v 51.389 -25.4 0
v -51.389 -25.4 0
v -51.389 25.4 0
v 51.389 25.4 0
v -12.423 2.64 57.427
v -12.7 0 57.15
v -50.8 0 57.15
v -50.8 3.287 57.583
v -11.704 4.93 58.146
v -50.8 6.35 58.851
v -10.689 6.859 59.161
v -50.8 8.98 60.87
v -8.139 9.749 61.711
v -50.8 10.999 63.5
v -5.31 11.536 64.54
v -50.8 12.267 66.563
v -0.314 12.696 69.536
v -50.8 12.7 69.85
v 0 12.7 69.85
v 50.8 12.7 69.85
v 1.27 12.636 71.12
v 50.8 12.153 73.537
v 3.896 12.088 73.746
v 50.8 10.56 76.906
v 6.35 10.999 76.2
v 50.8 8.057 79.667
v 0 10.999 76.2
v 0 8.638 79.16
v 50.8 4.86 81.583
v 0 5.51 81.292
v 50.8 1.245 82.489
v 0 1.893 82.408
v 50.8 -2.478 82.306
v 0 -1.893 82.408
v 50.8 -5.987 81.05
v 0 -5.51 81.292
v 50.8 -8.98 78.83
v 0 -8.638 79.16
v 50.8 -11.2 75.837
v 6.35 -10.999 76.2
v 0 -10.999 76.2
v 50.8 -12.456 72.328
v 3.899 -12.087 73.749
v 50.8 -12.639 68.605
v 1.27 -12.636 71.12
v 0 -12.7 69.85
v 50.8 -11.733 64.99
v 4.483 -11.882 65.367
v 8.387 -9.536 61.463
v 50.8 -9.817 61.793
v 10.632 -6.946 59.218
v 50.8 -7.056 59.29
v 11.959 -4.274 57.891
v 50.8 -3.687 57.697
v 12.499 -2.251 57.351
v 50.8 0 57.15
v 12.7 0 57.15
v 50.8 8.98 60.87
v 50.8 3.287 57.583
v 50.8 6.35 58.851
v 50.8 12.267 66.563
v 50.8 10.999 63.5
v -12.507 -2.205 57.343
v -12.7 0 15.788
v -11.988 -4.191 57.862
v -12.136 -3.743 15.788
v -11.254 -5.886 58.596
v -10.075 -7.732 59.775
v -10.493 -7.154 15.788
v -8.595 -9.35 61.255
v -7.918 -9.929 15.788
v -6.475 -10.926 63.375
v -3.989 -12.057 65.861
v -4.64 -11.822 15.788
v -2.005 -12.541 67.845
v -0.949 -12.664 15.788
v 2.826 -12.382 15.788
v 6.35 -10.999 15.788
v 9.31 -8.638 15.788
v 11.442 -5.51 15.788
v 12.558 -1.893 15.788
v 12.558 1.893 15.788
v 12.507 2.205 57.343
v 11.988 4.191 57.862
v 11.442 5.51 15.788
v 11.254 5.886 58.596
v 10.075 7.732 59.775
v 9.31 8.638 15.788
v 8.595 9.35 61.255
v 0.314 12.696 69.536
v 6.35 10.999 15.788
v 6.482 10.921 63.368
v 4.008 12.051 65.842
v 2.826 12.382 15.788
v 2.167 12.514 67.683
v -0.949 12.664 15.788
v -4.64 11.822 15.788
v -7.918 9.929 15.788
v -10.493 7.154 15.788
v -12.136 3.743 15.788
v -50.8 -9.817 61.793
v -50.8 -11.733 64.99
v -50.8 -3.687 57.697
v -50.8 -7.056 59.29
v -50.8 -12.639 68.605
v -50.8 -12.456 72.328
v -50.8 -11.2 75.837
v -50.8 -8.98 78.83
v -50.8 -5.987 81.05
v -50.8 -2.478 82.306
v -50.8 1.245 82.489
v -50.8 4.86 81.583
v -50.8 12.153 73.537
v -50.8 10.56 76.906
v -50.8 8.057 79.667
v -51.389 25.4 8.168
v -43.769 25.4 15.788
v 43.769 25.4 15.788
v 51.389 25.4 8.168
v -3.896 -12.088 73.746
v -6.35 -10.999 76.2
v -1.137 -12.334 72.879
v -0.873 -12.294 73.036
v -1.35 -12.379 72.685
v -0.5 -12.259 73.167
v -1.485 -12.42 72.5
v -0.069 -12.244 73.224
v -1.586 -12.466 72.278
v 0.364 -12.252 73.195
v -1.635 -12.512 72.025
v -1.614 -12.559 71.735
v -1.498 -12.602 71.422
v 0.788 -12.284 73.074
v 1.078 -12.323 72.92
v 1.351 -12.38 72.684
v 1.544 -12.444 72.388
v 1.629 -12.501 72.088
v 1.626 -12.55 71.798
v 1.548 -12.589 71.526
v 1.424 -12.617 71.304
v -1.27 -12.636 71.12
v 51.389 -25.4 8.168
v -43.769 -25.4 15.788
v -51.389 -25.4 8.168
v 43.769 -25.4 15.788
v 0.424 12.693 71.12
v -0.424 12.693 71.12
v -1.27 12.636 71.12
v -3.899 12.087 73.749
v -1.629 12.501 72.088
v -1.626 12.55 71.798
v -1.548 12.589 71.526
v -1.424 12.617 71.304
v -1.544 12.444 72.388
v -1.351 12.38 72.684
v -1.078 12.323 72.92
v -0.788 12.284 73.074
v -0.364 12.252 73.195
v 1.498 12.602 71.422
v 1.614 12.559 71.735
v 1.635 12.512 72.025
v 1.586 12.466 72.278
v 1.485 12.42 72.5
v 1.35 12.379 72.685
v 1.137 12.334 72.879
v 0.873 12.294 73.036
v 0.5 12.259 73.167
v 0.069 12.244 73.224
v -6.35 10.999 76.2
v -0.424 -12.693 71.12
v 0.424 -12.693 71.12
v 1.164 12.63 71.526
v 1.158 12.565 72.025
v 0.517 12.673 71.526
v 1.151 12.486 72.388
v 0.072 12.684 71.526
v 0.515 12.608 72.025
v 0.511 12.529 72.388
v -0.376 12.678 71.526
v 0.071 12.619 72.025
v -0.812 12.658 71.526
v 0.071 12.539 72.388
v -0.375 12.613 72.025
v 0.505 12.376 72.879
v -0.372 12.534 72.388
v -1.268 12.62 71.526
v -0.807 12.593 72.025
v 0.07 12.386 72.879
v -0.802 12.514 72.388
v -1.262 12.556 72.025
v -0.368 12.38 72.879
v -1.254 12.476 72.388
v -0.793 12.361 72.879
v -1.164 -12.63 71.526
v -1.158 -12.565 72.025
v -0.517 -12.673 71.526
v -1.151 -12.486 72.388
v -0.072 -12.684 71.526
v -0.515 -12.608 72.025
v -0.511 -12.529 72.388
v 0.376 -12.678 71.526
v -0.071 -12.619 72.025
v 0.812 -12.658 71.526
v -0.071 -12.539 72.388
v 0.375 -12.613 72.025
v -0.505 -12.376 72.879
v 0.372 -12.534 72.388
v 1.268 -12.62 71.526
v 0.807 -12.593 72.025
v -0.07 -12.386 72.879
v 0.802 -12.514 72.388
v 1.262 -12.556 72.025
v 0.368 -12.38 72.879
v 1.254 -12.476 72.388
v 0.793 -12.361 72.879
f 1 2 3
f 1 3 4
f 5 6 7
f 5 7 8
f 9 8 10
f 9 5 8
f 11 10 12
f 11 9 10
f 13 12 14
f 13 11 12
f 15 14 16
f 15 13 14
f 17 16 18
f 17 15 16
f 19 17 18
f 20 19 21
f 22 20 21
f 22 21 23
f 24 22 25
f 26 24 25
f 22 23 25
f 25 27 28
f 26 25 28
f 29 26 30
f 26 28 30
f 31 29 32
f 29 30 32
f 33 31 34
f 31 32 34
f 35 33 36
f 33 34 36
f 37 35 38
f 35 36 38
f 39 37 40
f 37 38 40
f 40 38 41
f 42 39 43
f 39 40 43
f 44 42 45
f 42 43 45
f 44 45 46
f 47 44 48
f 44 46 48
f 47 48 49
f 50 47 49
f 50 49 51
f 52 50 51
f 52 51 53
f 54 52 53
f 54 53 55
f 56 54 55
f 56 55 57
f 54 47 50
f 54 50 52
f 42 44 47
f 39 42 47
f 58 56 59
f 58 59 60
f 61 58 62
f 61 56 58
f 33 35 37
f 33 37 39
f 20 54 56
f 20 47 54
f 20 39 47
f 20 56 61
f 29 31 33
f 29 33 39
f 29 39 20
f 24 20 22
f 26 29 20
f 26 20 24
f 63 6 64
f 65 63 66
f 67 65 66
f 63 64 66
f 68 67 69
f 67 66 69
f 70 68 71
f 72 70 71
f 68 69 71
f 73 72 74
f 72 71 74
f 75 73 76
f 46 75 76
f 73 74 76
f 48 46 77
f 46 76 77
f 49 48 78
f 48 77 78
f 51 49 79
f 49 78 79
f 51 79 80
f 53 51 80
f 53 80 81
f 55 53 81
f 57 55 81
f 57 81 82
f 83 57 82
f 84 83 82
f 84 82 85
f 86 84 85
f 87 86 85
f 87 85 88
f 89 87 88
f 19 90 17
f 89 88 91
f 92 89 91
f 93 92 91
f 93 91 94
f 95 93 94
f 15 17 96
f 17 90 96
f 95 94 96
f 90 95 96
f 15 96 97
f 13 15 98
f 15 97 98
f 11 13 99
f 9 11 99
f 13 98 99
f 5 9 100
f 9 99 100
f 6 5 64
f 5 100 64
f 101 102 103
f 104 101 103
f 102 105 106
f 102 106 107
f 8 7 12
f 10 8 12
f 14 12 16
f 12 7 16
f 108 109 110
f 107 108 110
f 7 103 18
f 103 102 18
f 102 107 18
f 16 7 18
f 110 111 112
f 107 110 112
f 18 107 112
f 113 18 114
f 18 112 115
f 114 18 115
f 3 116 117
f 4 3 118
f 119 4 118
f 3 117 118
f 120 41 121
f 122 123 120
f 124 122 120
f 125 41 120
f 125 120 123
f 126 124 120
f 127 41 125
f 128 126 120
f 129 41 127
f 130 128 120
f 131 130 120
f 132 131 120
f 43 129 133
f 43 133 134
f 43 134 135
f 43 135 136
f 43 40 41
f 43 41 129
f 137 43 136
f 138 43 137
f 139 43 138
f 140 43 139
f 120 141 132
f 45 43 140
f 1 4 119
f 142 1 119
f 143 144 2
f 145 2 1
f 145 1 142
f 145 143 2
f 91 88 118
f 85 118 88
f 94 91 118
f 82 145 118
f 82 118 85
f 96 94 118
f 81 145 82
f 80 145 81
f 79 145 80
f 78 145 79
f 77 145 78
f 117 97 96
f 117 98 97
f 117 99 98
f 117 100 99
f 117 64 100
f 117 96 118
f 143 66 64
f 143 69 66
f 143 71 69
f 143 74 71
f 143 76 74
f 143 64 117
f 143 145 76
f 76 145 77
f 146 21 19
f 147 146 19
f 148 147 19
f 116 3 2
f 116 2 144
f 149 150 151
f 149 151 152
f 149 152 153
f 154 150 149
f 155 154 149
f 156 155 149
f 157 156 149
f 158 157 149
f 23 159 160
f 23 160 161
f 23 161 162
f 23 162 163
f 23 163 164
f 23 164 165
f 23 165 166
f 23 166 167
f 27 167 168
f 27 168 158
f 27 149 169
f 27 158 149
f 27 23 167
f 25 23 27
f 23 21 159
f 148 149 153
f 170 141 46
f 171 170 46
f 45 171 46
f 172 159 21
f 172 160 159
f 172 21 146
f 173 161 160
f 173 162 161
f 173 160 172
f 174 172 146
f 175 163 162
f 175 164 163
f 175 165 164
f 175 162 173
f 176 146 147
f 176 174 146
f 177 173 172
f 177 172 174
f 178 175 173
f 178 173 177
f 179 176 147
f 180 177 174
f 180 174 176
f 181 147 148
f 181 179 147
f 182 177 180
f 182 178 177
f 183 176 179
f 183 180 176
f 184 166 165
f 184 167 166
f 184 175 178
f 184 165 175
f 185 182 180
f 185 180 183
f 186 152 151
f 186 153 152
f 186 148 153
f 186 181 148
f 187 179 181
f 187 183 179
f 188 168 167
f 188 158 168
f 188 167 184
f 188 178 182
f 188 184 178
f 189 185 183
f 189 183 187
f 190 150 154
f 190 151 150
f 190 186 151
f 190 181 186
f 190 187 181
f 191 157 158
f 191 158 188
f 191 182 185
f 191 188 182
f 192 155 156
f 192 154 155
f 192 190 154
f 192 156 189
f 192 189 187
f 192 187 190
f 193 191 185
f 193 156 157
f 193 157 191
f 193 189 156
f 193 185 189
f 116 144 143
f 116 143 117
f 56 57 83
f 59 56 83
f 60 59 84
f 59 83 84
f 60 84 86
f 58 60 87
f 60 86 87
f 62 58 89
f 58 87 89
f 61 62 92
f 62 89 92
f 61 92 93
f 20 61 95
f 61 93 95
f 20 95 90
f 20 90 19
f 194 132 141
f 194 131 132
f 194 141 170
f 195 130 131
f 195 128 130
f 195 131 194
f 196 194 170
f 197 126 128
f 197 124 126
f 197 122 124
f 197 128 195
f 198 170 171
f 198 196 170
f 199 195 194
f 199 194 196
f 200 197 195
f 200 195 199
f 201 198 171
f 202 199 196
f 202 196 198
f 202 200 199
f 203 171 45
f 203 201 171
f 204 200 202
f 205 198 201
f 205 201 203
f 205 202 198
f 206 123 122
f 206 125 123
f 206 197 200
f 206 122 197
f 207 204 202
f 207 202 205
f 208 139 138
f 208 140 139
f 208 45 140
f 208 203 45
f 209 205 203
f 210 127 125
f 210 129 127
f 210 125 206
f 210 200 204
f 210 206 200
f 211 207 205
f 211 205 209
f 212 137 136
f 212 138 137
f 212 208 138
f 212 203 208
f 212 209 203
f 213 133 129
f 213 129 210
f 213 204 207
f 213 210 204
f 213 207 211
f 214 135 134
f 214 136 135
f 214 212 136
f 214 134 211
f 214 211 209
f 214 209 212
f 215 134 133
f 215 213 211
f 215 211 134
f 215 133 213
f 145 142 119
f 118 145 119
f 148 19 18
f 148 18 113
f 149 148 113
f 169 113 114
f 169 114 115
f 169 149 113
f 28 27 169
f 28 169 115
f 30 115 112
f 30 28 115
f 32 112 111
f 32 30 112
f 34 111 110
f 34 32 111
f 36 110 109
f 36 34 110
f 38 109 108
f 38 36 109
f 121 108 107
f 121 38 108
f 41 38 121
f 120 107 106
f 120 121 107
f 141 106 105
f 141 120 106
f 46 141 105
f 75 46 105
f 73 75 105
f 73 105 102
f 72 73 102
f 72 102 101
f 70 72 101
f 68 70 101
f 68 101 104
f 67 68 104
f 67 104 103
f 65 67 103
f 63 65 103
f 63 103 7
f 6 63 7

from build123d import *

# Parameters (mm, degrees)
F0_W         = 12.7
F0_H         = 6.35
F0_H_2       = 47.7120632529
F0_H_3       = 15.7879367471
F0_W_2       = 38.6885356486
F2_DEPTH     = 25.4
F4_DEPTH     = 50.8
F5_SIZE      = 7.62
F6_T4_ANGLE  = 174.612014659
F6_S5_R      = 12.7
F6_T6_DEPTH  = 17
F6_T10_ANGLE = 174.612014659
F6_S11_R     = 12.7
F6_T12_DEPTH = 17


# Not quite as in the source:
# - a fillet or chamfer that OpenCascade refuses, or shapes differently, is made with other operations: its cross-section is extruded or revolved along the edge and cut away or added


with BuildPart() as f1:
    # F0 (on Front) → F1 (revolve)
    with BuildSketch(Plane.XZ):
        with Locations((-6.35, 73.025)):
            Rectangle(F0_W, F0_H)
        with Locations((-6.35, 66.675)):
            Rectangle(F0_W, F0_H)
        with Locations((-6.35, 39.6439683735)):
            Rectangle(F0_W, F0_H_2)
    revolve(axis=Axis((0, 0, 38.1), (0, 0, 1)))

    # F0 (on Front) → F2 (join, symmetric)
    with BuildSketch(Plane.XZ):
        with Locations((-6.35, 7.8939683735)):
            Rectangle(F0_W, F0_H_3)
        with Locations((6.35, 7.8939683735)):
            Rectangle(F0_W, F0_H_3)
        with Locations((-32.0442678243, 7.8939683735)):
            Rectangle(F0_W_2, F0_H_3)
        with Locations((32.0442678243, 7.8939683735)):
            Rectangle(F0_W_2, F0_H_3)
    extrude(amount=F2_DEPTH, both=True)

    # F3 (on Right) → F4 (join, symmetric)
    with BuildSketch(Plane.YZ):
        with BuildLine():
            ThreePointArc((0, 57.15), (8.9802561211, 60.8697438789), (12.7, 69.85))
            ThreePointArc((12.7, 69.85), (-8.9802561211, 78.8302561211), (0, 57.15))
        make_face()
    extrude(amount=F4_DEPTH, both=True)

    # F5
    f5_edges = [f1.edges().sort_by_distance(p)[0] for p in [
        (-51.388536, 0, 15.787937),
        (51.388536, 0, 15.787937),
    ]]
    chamfer(f5_edges, length=F5_SIZE)

    # F6: fillet of radius 5.08 on 3 edges, made by hand


with BuildPart() as f6_tool2:
    # F6_s3 → F6_t4 (revolve)
    with BuildSketch(Plane(origin=(0, 0, 0), x_dir=(0, 0, 1), z_dir=(0.0470017192, -0.9988948085, 0))):
        with BuildLine():
            ThreePointArc((71.12, -12.7), (74.7121024484, -11.2121024484), (76.2, -7.62))
            Line((76.2, -7.62), (76.2, -12.7))
            Line((76.2, -12.7), (71.12, -12.7))
        make_face()
    revolve(axis=Axis((0, 0, 76.2), (0, 0, 1)), revolution_arc=F6_T4_ANGLE)

    # F6_s5 → F6_t6 (cut, symmetric)
    with BuildSketch(Plane.YZ):
        with Locations((0, 69.85)):
            Circle(F6_S5_R)
    extrude(amount=F6_T6_DEPTH, both=True, mode=Mode.SUBTRACT)


with BuildPart() as f1_1:
    add(f1.part)

    # F6_t1: cut F6_tool2
    add(f6_tool2.part, mode=Mode.SUBTRACT)


with BuildPart() as f6_tool8:
    # F6_s9 → F6_t10 (revolve)
    with BuildSketch(Plane(origin=(0, 0, 0), x_dir=(0, 0, 1), z_dir=(-0.0470017192, 0.9988948085, 0))):
        with BuildLine():
            ThreePointArc((71.12, -12.7), (74.7121024484, -11.2121024484), (76.2, -7.62))
            Line((76.2, -7.62), (76.2, -12.7))
            Line((76.2, -12.7), (71.12, -12.7))
        make_face()
    revolve(axis=Axis((0, 0, 76.2), (0, 0, 1)), revolution_arc=F6_T10_ANGLE)

    # F6_s11 → F6_t12 (cut, symmetric)
    with BuildSketch(Plane.YZ):
        with Locations((0, 69.85)):
            Circle(F6_S11_R)
    extrude(amount=F6_T12_DEPTH, both=True, mode=Mode.SUBTRACT)


with BuildPart() as f1_2:
    add(f1_1.part)

    # F6_t7: cut F6_tool8
    add(f6_tool8.part, mode=Mode.SUBTRACT)


solid = f1_2.part
